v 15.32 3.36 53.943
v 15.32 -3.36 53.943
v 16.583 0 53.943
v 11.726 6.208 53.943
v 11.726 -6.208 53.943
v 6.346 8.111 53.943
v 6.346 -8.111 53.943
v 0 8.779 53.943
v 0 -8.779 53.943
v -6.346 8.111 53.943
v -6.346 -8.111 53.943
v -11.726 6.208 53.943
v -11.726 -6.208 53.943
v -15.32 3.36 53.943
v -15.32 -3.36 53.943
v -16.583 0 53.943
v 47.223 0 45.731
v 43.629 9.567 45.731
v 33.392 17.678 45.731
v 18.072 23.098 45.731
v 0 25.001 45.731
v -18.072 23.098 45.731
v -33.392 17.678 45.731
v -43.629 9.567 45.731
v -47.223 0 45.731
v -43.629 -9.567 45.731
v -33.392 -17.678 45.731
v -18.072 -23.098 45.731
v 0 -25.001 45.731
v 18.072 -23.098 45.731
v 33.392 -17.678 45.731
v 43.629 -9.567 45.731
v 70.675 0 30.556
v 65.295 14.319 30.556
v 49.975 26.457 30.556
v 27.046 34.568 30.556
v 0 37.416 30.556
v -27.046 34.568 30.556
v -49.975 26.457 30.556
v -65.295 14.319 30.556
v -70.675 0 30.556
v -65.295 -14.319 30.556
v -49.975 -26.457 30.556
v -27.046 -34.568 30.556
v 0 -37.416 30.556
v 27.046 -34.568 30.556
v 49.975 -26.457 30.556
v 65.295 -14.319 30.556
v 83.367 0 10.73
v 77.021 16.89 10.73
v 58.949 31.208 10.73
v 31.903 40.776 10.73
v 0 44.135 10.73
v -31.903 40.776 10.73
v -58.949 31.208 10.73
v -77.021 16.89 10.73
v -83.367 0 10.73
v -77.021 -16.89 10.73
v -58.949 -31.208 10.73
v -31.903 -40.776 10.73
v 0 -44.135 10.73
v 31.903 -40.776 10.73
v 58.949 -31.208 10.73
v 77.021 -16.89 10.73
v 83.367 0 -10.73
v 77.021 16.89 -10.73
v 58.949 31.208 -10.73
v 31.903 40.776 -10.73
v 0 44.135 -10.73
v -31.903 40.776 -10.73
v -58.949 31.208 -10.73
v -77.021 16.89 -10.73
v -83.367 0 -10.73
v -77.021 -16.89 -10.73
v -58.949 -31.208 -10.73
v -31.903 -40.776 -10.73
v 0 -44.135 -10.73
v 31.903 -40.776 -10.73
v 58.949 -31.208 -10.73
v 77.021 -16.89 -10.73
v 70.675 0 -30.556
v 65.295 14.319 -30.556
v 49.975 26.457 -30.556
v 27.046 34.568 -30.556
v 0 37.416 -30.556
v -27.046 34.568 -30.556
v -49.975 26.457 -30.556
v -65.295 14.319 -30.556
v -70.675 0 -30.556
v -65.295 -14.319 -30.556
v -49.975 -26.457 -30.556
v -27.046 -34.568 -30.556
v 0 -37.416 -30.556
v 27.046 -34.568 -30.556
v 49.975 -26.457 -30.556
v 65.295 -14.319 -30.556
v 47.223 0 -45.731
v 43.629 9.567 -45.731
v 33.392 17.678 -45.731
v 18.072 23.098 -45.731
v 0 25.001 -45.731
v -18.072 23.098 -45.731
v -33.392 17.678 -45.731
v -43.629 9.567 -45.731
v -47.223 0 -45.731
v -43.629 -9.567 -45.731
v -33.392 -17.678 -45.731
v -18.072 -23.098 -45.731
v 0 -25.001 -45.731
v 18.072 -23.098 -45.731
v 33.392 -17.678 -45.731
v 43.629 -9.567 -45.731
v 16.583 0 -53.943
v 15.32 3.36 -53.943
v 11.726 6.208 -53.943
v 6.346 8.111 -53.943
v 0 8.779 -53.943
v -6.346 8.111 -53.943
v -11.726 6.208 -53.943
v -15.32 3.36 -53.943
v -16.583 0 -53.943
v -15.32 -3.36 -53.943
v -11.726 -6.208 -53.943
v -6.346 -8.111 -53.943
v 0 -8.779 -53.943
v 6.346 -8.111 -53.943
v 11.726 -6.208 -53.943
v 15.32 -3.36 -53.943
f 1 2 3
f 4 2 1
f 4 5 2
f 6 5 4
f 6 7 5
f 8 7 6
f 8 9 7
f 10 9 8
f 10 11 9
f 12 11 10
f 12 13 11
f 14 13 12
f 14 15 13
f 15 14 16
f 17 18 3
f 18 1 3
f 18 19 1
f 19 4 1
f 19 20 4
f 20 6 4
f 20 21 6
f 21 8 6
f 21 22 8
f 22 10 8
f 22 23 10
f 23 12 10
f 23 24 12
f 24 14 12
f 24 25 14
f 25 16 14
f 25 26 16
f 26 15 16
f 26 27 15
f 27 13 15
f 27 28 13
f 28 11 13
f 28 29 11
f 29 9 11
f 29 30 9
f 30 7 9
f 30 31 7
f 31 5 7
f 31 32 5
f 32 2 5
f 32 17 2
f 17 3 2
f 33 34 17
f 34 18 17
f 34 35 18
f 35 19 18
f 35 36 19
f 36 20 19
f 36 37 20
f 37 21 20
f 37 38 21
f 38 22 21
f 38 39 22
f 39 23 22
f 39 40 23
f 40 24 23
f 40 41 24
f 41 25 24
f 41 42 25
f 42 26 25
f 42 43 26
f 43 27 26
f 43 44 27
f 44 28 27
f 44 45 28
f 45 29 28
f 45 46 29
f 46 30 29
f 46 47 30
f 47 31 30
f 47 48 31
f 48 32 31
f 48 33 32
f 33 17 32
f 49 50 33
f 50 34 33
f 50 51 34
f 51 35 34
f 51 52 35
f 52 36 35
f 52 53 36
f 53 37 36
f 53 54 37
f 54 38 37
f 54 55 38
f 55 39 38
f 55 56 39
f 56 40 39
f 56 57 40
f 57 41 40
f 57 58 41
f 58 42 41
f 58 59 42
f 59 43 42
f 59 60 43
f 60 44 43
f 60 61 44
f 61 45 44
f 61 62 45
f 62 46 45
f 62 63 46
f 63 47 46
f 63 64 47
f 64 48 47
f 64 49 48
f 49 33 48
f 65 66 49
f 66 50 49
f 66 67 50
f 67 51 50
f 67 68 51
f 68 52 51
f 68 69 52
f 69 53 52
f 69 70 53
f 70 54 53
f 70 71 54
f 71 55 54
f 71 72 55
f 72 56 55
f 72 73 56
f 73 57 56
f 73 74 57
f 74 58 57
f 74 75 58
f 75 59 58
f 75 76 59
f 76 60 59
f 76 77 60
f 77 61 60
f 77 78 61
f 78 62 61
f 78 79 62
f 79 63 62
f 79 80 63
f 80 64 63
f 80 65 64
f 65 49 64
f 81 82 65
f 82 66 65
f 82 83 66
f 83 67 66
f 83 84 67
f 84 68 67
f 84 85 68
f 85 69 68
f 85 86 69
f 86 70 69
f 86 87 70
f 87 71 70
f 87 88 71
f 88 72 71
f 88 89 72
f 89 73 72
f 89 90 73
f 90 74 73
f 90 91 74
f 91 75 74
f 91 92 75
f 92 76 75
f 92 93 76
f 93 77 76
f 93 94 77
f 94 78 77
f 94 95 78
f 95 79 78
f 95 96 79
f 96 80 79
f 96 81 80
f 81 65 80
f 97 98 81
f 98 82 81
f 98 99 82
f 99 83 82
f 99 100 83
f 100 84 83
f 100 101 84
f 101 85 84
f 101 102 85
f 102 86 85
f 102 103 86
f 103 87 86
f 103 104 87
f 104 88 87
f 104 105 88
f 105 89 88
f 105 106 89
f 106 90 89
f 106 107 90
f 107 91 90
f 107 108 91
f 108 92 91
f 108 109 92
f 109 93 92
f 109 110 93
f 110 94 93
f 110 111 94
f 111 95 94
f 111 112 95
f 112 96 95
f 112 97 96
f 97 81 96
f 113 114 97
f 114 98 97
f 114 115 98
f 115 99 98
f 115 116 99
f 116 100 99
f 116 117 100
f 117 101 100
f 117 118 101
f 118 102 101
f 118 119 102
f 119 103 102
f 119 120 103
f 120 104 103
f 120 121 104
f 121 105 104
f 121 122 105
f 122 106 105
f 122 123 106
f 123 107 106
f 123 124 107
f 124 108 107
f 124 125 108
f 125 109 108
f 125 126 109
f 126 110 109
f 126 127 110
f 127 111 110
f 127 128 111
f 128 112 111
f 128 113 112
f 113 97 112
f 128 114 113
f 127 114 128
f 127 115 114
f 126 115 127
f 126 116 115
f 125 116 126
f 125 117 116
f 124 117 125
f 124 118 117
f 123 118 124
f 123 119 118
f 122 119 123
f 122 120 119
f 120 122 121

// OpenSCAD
// Generated by SolidPython 1.0.1 on 2020-07-29 00:46:53


scale(v = [17, 9, 11]) {
	sphere(r = 5);
}
/***********************************************
*********      SolidPython code:      **********
************************************************
 
# import packages: SolidPython
from solid import *
from solid.utils import *
from itertools import chain, combinations, permutations


class Resize:

    def __init__(self, scad_file):
        self.scad_file = scad_file
        #self.scad_file = import_scad(scad_file)
        # cone/cylinder param:
        self.r1 = 0
        self.r2 = 0
        self.h = 0
        # rectangular prism param:
        self.w = 0
        self.l = 0
        # ellipse param:
        self.r = 0

    # import OpenScad code (file name corresponds to shape)


    # classify shape + parameters
    def assign(self, param1, param2, param3):
        if self.scad_file == 'cone.scad':
            self.r1 = param1
            self.r2 = param2
            self.h = param3
        elif self.scad_file == 'cylinder.scad':
            self.r1 = param1
            self.r2 = param2
            self.h = param3
        elif self.scad_file == 'rectangularPrism.scad':
            self.h = param1
            self.l = param2
            self.w = param3
        else:
            self.r = param1
            self.h = param2

    # resize parameters
    def iterate(self):
        x = range(3, 20, 2)
        i = 1
        if self.scad_file == 'cone.scad':
            tempList = list(permutations(x, 2))
            for temp in tempList:
                param1 = temp[0]
                param2 = temp[1]
                filepath = 'produced_scad_files/' + 'cone' + str(param1) + '_' + str(param2) + '_' + '.scad'
                scad_render_to_file(cylinder(h=param1, r1=param2, r2=0), filepath)

        elif self.scad_file == 'cylinder.scad':
            tempList = list(permutations(x, 3))
            for temp in tempList:
                param1 = temp[0]
                param2 = temp[1]
                filepath = 'produced_scad_files/' + 'cylinder' + str(param1) + '_' + str(param2) + '_' + '.scad'
                scad_render_to_file(cylinder(h=param1, r1=param2, r2=param2), filepath)

        elif self.scad_file == 'rectangularPrism.scad':
            tempList = list(permutations(x, 3))
            for temp in tempList:
                param1 = temp[0]
                param2 = temp[1]
                param3 = temp[2]
                filepath = 'produced_scad_files/' + 'rectangularPrism' + str(param1) + '_' + str(param2) + '_' + str(
                    param3) + '.scad'
                scad_render_to_file(cube(size=(param1, param2, param3)), filepath)

        elif self.scad_file == 'ellipse.scad':
            tempList = list(permutations(x, 4))
            for temp in tempList:
                param1 = temp[0]
                param2 = temp[1]
                param3 = temp[2]
                param4 = temp[3]
                filepath = 'produced_scad_files/' + 'ellipse' + str(param1) + '_' + str(param2) + '_' + str(param3) + '_' + str(param4) + '.scad'
                scad_render_to_file(scale([param1, param2, param3])(sphere(r=param4)), filepath)

    def render_to_scadfile(self):
        scad_render_to_file(scad, 'example.scad') 
 
************************************************/
